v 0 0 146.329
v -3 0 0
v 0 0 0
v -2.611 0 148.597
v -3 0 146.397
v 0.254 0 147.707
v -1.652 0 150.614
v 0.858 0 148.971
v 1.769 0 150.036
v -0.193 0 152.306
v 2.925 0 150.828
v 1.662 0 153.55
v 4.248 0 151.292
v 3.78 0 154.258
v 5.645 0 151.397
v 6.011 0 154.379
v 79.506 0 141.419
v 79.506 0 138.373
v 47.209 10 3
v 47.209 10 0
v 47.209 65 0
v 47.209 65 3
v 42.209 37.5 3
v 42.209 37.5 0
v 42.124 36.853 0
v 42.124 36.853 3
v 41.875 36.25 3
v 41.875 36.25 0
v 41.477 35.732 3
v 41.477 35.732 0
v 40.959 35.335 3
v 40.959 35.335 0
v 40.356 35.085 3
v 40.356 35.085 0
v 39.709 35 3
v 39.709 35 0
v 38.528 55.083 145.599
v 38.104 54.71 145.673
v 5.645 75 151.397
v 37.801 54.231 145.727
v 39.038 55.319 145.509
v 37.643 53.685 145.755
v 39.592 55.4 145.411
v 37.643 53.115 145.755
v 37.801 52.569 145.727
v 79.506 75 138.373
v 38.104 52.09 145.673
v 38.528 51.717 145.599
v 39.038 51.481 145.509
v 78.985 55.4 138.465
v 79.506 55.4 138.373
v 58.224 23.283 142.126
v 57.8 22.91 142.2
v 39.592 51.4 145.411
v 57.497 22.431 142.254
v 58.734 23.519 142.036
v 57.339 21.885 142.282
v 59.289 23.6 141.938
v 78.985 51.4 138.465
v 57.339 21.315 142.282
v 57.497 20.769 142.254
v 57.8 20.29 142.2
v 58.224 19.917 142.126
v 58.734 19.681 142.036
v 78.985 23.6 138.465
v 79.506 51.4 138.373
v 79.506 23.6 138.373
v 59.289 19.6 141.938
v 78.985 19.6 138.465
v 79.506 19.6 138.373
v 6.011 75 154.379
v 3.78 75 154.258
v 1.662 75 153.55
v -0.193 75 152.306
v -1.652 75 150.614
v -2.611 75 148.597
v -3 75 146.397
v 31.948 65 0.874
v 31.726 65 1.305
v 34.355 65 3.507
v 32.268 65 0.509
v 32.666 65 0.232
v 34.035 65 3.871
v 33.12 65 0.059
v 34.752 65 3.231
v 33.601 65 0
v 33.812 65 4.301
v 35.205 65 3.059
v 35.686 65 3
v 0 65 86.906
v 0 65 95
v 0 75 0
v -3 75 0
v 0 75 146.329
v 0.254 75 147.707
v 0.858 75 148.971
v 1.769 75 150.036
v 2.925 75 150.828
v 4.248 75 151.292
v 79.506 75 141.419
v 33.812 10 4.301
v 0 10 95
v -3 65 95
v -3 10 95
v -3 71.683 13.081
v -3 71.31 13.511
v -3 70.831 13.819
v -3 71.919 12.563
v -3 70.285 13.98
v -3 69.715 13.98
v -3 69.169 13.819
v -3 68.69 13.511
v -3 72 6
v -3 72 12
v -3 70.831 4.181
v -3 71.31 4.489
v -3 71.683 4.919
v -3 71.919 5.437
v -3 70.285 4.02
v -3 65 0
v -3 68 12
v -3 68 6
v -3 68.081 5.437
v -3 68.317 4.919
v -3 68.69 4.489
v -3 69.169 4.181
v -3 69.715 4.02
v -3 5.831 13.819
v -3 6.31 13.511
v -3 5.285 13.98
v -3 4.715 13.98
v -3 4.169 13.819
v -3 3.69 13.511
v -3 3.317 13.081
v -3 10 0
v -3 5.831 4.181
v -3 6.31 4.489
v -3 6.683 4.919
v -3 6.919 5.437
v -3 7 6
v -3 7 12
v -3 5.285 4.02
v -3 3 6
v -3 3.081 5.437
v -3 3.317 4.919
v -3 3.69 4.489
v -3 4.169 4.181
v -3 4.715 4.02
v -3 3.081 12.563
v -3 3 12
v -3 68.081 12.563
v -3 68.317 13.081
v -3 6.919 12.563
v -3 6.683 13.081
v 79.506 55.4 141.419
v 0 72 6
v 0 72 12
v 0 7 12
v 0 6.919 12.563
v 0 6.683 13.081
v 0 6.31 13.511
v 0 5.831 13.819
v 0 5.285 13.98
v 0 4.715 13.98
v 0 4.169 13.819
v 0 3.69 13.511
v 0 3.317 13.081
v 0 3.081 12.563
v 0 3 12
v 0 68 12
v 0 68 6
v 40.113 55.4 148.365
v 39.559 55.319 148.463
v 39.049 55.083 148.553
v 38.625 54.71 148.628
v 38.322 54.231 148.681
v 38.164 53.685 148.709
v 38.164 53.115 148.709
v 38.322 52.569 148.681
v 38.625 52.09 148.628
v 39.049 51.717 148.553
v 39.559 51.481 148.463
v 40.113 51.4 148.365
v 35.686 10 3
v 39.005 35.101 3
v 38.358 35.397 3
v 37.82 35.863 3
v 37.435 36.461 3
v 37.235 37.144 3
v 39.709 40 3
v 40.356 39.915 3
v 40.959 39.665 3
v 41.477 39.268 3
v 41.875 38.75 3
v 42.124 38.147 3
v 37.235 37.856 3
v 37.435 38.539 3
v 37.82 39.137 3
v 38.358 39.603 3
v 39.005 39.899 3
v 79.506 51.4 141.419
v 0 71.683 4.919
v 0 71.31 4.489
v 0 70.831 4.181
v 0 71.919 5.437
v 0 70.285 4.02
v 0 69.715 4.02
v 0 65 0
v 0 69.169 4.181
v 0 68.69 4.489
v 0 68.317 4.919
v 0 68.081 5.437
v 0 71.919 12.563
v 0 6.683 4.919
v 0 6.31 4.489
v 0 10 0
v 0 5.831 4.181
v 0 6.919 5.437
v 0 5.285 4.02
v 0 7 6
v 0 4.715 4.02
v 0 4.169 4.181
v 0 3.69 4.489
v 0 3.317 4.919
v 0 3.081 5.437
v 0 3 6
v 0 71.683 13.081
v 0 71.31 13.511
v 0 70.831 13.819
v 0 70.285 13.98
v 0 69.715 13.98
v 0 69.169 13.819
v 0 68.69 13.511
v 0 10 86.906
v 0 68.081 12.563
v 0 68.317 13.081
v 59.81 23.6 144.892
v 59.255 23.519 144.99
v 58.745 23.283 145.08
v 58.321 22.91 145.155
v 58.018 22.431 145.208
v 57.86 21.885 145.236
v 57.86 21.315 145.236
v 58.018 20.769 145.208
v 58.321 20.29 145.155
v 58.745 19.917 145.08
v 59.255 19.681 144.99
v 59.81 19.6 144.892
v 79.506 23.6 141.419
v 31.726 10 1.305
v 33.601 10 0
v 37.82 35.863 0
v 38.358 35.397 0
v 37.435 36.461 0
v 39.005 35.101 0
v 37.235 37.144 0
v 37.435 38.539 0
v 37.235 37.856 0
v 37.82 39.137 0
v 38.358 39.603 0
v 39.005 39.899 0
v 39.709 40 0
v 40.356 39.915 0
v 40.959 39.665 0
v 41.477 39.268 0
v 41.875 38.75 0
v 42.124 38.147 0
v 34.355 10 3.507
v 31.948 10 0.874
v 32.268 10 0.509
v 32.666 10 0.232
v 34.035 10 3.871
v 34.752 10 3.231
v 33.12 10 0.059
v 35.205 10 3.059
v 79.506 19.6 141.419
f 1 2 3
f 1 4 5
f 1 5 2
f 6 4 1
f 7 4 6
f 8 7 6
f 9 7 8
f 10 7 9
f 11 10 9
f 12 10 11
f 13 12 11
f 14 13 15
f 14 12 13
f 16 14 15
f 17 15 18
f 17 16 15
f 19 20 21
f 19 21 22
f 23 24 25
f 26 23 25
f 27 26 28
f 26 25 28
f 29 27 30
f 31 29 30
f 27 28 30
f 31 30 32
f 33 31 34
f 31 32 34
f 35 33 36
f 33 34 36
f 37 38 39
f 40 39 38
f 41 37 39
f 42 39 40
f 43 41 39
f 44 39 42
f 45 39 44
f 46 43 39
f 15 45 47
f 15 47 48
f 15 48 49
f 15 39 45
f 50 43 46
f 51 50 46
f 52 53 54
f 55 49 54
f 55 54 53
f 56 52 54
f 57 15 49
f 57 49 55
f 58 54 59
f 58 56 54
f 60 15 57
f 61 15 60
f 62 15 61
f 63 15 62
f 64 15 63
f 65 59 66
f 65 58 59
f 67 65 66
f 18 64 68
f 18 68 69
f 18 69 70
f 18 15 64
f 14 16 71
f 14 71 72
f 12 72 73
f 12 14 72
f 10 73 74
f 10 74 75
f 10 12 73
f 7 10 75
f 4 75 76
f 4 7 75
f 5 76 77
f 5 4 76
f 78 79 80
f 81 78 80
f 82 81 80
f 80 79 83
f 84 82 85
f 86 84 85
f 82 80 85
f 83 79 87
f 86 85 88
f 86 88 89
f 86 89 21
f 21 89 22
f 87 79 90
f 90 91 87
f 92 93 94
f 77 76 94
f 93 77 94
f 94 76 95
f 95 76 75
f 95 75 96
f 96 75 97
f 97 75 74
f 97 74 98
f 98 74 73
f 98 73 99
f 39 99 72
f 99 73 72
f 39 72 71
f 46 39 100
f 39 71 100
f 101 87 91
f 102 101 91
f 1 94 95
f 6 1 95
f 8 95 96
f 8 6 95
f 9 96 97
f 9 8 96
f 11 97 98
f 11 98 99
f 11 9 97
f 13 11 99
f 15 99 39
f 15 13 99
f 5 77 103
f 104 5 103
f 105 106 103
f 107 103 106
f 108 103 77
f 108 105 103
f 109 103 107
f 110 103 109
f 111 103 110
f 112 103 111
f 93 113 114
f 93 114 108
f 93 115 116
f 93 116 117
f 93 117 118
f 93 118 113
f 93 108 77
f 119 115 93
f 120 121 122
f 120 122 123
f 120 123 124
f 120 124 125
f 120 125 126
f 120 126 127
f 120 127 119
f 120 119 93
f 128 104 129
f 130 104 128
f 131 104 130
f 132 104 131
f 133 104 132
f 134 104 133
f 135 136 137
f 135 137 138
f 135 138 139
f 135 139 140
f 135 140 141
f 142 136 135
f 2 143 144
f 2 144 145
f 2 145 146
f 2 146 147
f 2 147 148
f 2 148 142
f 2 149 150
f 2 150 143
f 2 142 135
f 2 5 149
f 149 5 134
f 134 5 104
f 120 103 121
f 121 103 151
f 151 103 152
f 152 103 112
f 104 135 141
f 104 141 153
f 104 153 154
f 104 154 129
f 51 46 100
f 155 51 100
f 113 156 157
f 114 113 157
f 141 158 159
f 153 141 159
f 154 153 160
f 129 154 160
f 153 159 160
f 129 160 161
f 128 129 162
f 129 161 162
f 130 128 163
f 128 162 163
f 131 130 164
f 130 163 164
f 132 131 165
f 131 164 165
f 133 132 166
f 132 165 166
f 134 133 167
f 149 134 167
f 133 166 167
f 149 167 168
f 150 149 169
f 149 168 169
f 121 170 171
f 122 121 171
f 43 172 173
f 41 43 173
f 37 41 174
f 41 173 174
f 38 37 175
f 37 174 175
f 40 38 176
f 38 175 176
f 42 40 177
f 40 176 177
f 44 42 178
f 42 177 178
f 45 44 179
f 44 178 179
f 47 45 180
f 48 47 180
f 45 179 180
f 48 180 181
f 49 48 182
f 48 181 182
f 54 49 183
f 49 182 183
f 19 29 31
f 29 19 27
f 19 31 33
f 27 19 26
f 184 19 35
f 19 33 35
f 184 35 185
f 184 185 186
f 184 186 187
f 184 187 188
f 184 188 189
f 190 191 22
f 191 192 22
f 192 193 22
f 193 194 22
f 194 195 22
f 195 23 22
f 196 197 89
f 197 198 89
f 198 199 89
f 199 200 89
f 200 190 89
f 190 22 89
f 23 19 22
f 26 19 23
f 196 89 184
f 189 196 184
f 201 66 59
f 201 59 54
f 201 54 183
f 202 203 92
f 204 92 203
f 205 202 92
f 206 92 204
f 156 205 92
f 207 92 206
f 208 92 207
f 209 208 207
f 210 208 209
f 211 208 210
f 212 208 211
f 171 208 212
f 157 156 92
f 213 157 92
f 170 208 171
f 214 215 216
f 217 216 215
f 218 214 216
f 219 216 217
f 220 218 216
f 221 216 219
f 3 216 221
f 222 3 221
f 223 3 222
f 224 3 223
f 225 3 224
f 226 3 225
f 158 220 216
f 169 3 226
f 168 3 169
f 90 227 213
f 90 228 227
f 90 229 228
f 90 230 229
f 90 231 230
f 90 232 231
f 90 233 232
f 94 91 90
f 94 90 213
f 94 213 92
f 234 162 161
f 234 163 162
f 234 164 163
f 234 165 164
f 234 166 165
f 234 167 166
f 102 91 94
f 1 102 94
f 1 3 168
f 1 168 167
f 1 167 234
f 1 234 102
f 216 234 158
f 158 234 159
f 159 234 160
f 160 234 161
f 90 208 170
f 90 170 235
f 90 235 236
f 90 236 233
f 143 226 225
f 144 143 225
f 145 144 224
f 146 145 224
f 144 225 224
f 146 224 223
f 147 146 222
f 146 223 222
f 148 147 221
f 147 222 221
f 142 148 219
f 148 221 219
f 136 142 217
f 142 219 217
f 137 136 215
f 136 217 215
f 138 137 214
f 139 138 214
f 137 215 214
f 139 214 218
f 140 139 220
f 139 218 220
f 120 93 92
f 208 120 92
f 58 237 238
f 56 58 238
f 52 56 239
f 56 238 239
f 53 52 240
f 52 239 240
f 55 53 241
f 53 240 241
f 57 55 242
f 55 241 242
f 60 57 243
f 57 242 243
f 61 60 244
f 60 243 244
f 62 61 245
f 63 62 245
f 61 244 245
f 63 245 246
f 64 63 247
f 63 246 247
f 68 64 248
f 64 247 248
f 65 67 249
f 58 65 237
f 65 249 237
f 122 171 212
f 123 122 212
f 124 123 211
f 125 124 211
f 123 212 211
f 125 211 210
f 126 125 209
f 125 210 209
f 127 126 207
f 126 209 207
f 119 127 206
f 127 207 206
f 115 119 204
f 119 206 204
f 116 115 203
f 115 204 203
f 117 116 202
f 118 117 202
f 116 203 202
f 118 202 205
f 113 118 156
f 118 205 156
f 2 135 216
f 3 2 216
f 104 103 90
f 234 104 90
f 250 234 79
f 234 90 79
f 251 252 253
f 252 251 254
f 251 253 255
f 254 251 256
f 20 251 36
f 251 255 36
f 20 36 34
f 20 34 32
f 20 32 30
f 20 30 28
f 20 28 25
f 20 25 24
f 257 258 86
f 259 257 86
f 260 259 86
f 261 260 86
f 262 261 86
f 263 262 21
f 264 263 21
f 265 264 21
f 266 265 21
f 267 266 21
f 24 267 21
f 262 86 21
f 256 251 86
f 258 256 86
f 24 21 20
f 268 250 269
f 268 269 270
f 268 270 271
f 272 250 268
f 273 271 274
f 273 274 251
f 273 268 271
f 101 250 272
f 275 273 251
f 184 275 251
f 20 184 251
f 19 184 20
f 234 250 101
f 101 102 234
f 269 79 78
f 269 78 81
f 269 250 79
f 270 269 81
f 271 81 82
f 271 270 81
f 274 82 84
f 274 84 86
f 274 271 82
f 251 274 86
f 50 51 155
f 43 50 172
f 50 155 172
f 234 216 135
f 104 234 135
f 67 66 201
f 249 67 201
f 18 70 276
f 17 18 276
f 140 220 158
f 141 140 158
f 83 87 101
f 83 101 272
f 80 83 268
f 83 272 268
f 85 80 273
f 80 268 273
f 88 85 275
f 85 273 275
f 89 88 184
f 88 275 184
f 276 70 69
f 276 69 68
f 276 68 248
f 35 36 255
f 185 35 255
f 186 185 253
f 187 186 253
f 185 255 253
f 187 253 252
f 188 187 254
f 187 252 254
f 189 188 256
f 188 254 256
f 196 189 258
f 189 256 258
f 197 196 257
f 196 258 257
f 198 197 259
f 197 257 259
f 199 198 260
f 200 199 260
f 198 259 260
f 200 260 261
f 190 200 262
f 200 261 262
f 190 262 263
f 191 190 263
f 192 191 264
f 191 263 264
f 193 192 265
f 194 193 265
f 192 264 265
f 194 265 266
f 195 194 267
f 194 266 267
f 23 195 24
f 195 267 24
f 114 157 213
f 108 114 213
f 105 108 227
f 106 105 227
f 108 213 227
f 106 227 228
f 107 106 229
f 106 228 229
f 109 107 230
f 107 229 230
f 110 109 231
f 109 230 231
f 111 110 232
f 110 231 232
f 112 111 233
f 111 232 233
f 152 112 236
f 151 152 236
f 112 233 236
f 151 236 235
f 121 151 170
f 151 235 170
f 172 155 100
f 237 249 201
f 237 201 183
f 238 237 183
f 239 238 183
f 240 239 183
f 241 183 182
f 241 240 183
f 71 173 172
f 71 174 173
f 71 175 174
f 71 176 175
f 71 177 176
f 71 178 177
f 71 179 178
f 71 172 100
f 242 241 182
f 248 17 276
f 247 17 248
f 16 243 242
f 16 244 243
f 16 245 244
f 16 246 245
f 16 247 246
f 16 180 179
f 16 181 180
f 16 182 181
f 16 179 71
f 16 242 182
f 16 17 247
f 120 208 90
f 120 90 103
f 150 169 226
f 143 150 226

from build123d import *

# Parameters (mm, degrees)
F1_DEPTH  = 75
F2_W      = 55
F2_H      = 95
F3_DEPTH  = 3.001
F5_DEPTH  = 55
F7_DEPTH  = 3
F9_DEPTH  = 3
F10_R     = 2
F12_DEPTH = 3
F13_W     = 4
F13_H     = 3.0462798357
F14_DEPTH = 1


with BuildPart() as f1:
    # F0 (on Front) → F1 (new body)
    with BuildSketch(Plane.XZ):
        with BuildLine():
            Line((-3, 0), (0, 0))
            Line((0, 0), (0, 146.328642619))
            ThreePointArc((0, 146.328642619), (1.7690799336, 150.0361338491), (5.6451438845, 151.3967452123))
            Line((5.6451438845, 151.3967452123), (79.5057253604, 138.3731318873))
            Line((79.5057253604, 138.3731318873), (79.5057253604, 141.4194117229))
            Line((79.5057253604, 141.4194117229), (6.010801042, 154.3785498254))
            ThreePointArc((6.010801042, 154.3785498254), (-0.193413929, 152.3056303595), (-3, 146.396962731))
            Line((-3, 146.396962731), (-3, 146.1928579517))
            Line((-3, 146.1928579517), (-3, 0))
        make_face()
    extrude(amount=-F1_DEPTH)

    # F2 (on face) → F3 (cut, through all)
    with BuildSketch(Plane.YZ):
        with Locations((37.5, 47.5)):
            Rectangle(F2_W, F2_H)
    extrude(amount=-F3_DEPTH, mode=Mode.SUBTRACT)

    # F4 (on face) → F5 (join)
    with BuildSketch(Plane.XZ.offset(-65)):
        Polygon((0, 95), (-3, 95), (32.2094485164, 0), (47.2094485164, 0), (47.2094485164, 3), (34.2969885133, 3), align=None)
    extrude(amount=F5_DEPTH)

    # F6 (on face) → F7 (cut)
    with BuildSketch(Plane(origin=(0, 0, 0), x_dir=(1, 0, 0), z_dir=(0, 0, -1))):
        with BuildLine():
            ThreePointArc((42.2094485164, -37.5), (41.4772154693, -35.732233047), (39.7094485164, -35))
            Line((39.7094485164, -35), (39.7094485164, -40))
            ThreePointArc((39.7094485164, -40), (41.4772154693, -39.267766953), (42.2094485164, -37.5))
        make_face()
        with BuildLine():
            Line((39.7094485164, -40), (39.7094485164, -35))
            ThreePointArc((39.7094485164, -35), (37.2094485164, -37.5), (39.7094485164, -40))
        make_face()
    extrude(amount=-F7_DEPTH, mode=Mode.SUBTRACT)

    # F8 (on face) → F9 (cut, through all)
    with BuildSketch(Plane.YZ):
        with BuildLine():
            Line((7, 6), (7, 12))
            ThreePointArc((7, 12), (5, 14), (3, 12))
            Line((3, 12), (3, 6))
            ThreePointArc((3, 6), (5, 4), (7, 6))
        make_face()
        with BuildLine():
            ThreePointArc((72, 12), (70, 14), (68, 12))
            Line((68, 12), (68, 6))
            ThreePointArc((68, 6), (70, 4), (72, 6))
            Line((72, 6), (72, 12))
        make_face()
    extrude(amount=-F9_DEPTH, mode=Mode.SUBTRACT)

    # F10
    f10_edges = [f1.edges().sort_by_distance(p)[0] for p in [
        (32.209449, 37.5, 0),
        (34.296989, 37.5, 3),
    ]]
    fillet(f10_edges, radius=F10_R)

    # F11 (on face) → F12 (cut, through all)
    with BuildSketch(Plane(origin=(26.5815346978, 0, 150.7513744689), x_dir=(0.984807753, 0, -0.1736481777), z_dir=(0.1736481777, 0, 0.984807753))):
        with BuildLine():
            Line((53.7406316114, 23.6), (33.7406316114, 23.6))
            ThreePointArc((33.7406316114, 23.6), (31.7406316114, 21.6), (33.7406316114, 19.6))
            Line((33.7406316114, 19.6), (53.7406316114, 19.6))
            Line((53.7406316114, 19.6), (53.7406316114, 23.6))
        make_face()
        with BuildLine():
            Line((13.7406316114, 51.4), (33.7406316114, 51.4))
            Line((33.7406316114, 51.4), (53.7406316114, 51.4))
            Line((53.7406316114, 51.4), (53.7406316114, 55.4))
            Line((53.7406316114, 55.4), (13.7406316114, 55.4))
            ThreePointArc((13.7406316114, 55.4), (11.7406316114, 53.4), (13.7406316114, 51.4))
        make_face()
    extrude(amount=-F12_DEPTH, mode=Mode.SUBTRACT)

    # F13 (on face) → F14 (cut)
    with BuildSketch(Plane.YZ.offset(79.5057253604)):
        with Locations((21.6, 139.8962718051)):
            Rectangle(F13_W, F13_H)
        with Locations((53.4, 139.8962718051)):
            Rectangle(F13_W, F13_H)
    extrude(amount=-F14_DEPTH, mode=Mode.SUBTRACT)


solid = f1.part
